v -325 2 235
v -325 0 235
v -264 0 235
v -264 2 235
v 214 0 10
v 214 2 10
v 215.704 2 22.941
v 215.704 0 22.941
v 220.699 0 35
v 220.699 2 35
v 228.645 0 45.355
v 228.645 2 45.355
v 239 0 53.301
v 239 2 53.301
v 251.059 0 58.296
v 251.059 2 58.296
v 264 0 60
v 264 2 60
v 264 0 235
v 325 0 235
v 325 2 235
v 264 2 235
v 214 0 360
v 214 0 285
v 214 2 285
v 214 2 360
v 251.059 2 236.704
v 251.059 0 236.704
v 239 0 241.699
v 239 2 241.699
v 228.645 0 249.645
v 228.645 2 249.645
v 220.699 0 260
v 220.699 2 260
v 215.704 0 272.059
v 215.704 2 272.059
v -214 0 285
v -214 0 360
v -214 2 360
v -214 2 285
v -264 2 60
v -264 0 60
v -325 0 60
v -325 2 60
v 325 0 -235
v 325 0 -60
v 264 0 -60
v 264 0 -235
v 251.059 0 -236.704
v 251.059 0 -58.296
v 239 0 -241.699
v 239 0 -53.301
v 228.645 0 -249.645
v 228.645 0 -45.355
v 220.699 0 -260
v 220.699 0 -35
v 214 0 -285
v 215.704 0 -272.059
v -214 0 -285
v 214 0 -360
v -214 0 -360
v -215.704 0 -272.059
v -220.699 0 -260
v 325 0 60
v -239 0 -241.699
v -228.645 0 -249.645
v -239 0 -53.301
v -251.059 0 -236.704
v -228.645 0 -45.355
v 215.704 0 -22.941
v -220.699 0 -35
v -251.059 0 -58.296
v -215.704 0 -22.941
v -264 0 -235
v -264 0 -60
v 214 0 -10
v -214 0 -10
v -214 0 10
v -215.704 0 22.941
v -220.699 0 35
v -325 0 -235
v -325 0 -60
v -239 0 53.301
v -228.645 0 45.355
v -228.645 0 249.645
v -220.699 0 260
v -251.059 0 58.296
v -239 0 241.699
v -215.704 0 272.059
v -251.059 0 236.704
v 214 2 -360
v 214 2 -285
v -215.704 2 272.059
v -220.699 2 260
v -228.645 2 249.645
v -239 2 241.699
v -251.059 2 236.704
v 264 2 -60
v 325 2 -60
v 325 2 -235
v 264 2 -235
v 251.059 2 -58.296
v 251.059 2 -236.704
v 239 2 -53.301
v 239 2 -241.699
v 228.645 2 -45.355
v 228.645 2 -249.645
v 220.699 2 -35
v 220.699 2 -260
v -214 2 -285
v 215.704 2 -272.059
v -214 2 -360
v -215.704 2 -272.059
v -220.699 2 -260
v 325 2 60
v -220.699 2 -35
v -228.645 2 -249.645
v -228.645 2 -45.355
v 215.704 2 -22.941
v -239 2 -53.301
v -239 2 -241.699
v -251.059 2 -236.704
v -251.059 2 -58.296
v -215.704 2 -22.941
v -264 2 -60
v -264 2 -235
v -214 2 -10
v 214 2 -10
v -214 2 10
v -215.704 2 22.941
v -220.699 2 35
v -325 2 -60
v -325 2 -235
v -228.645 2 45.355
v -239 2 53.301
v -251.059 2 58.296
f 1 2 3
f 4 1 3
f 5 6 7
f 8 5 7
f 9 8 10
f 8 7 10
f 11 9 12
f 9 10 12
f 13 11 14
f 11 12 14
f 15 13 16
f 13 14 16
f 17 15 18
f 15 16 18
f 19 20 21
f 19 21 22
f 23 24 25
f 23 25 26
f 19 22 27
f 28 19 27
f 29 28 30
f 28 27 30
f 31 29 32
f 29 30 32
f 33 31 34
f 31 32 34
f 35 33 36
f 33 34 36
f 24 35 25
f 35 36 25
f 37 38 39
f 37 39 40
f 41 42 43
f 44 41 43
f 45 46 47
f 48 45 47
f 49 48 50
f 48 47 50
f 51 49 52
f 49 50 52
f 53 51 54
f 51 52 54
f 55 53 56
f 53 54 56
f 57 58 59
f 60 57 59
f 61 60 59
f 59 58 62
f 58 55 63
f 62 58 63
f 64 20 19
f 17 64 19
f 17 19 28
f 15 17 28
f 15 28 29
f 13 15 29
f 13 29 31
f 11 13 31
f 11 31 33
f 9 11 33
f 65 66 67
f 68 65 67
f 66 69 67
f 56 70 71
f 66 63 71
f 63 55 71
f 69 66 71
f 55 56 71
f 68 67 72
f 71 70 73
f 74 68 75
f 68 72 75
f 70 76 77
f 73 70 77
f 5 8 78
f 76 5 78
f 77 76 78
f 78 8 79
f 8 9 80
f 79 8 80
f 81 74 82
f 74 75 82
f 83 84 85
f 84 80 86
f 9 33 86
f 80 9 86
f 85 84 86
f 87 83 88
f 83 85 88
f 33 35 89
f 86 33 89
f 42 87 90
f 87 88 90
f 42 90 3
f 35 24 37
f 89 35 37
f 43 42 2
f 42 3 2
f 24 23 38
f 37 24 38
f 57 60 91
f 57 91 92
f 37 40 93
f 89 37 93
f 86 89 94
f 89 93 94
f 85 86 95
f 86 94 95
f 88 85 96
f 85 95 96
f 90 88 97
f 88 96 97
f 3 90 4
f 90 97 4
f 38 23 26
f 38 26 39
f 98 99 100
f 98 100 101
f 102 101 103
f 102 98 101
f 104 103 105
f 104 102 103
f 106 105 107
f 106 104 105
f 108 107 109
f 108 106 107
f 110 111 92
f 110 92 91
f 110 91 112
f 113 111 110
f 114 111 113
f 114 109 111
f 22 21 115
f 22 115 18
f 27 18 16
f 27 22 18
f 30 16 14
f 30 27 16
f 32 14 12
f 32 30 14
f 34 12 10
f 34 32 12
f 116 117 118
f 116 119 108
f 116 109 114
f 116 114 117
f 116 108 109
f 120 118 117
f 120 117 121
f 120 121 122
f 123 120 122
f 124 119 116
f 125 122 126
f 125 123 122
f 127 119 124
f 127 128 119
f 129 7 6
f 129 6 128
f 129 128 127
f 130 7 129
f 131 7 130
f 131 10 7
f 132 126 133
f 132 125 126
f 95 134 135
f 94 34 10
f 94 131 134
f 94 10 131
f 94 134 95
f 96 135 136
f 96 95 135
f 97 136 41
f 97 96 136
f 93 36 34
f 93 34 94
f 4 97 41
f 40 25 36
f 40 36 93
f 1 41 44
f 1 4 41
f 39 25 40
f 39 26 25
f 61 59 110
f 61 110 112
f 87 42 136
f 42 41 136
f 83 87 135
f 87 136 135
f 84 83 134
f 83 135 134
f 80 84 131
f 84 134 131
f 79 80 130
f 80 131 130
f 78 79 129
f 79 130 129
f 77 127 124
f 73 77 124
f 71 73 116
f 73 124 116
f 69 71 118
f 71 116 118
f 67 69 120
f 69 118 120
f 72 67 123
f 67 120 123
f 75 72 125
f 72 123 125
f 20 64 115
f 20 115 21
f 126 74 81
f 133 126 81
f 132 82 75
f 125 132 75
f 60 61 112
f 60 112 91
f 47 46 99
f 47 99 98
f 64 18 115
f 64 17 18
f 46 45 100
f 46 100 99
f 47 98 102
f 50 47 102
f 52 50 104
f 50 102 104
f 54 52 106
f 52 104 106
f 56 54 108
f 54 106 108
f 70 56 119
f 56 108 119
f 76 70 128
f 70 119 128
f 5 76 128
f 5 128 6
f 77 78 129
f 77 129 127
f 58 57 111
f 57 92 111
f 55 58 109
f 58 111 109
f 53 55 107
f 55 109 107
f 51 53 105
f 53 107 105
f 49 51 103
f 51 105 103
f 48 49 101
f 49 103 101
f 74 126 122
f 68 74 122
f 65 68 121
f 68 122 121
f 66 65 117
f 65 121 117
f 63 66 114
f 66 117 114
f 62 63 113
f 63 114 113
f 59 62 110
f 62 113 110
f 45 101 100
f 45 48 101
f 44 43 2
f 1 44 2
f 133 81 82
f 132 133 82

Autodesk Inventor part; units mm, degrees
ref_plane "YZ Plane" through (0, 0, 0) normal (1, 0, 0) x (0, 1, 0)
ref_plane "XZ Plane" through (0, 0, 0) normal (0, 1, 0) x (-1, 0, 0)
ref_plane "XY Plane" through (0, 0, 0) normal (0, 0, 1) x (1, 0, 0)
sketch "Sketch1" plane through (0, 0, 0) normal (0, 1, 0) x (-1, 0, 0)
  line L0 (-214, 360) -> (214, 360)
  line L1 (214, 360) -> (214, -360)
  line L2 (214, -360) -> (-214, -360)
  line L3 (-214, -360) -> (-214, 360)
  line L4 (-214, 360) -> (214, -360) construction
  line L5 (214, 360) -> (-214, -360) construction
  line L6 (214, -235) -> (325, -235)
  line L7 (325, -235) -> (325, -60)
  line L8 (325, -60) -> (214, -60)
  line L9 (214, -60) -> (214, -235)
  line L10 (214, 60) -> (325, 60)
  line L11 (325, 60) -> (325, 235)
  line L12 (325, 235) -> (214, 235)
  line L13 (214, 235) -> (214, 60)
  line L14 (0, 360) -> (0, 260) construction
  line L15 (0, 360) -> (100, 360) construction
  line L16 (-214, -235) -> (-325, -235)
  line L17 (-325, -235) -> (-325, -60)
  line L18 (-325, -60) -> (-214, -60)
  line L19 (-214, 60) -> (-325, 60)
  line L20 (-325, 60) -> (-325, 235)
  line L21 (-325, 235) -> (-214, 235)
  line L22 (-214, 235) -> (-214, 60)
  line L23 (-214, -60) -> (-214, -235)
  point P0 (0, 0)
  dimension "d0" = 720
  dimension "d1" = 428
  dimension "d4" = 111
  dimension "d5" = 175
  dimension "d6" = 125
  dimension "d7" = 111
  dimension "d8" = 175
  dimension "d9" = 125
  dimension "d10" = 100
  dimension "d11" = 90
extrude "Extrusion1" add sketch "Sketch1" along normal blind 2
fillet "Fillet1" radius 50 8 edges at (214, 1, -235) (214, 1, -60) (214, 1, 60) (214, 1, 235) (-214, 1, 60) (-214, 1, -60) (-214, 1, -235) (-214, 1, 235)
properties part number "Bottom Mounting Plate" material "Polycarbonate, Smoke"
